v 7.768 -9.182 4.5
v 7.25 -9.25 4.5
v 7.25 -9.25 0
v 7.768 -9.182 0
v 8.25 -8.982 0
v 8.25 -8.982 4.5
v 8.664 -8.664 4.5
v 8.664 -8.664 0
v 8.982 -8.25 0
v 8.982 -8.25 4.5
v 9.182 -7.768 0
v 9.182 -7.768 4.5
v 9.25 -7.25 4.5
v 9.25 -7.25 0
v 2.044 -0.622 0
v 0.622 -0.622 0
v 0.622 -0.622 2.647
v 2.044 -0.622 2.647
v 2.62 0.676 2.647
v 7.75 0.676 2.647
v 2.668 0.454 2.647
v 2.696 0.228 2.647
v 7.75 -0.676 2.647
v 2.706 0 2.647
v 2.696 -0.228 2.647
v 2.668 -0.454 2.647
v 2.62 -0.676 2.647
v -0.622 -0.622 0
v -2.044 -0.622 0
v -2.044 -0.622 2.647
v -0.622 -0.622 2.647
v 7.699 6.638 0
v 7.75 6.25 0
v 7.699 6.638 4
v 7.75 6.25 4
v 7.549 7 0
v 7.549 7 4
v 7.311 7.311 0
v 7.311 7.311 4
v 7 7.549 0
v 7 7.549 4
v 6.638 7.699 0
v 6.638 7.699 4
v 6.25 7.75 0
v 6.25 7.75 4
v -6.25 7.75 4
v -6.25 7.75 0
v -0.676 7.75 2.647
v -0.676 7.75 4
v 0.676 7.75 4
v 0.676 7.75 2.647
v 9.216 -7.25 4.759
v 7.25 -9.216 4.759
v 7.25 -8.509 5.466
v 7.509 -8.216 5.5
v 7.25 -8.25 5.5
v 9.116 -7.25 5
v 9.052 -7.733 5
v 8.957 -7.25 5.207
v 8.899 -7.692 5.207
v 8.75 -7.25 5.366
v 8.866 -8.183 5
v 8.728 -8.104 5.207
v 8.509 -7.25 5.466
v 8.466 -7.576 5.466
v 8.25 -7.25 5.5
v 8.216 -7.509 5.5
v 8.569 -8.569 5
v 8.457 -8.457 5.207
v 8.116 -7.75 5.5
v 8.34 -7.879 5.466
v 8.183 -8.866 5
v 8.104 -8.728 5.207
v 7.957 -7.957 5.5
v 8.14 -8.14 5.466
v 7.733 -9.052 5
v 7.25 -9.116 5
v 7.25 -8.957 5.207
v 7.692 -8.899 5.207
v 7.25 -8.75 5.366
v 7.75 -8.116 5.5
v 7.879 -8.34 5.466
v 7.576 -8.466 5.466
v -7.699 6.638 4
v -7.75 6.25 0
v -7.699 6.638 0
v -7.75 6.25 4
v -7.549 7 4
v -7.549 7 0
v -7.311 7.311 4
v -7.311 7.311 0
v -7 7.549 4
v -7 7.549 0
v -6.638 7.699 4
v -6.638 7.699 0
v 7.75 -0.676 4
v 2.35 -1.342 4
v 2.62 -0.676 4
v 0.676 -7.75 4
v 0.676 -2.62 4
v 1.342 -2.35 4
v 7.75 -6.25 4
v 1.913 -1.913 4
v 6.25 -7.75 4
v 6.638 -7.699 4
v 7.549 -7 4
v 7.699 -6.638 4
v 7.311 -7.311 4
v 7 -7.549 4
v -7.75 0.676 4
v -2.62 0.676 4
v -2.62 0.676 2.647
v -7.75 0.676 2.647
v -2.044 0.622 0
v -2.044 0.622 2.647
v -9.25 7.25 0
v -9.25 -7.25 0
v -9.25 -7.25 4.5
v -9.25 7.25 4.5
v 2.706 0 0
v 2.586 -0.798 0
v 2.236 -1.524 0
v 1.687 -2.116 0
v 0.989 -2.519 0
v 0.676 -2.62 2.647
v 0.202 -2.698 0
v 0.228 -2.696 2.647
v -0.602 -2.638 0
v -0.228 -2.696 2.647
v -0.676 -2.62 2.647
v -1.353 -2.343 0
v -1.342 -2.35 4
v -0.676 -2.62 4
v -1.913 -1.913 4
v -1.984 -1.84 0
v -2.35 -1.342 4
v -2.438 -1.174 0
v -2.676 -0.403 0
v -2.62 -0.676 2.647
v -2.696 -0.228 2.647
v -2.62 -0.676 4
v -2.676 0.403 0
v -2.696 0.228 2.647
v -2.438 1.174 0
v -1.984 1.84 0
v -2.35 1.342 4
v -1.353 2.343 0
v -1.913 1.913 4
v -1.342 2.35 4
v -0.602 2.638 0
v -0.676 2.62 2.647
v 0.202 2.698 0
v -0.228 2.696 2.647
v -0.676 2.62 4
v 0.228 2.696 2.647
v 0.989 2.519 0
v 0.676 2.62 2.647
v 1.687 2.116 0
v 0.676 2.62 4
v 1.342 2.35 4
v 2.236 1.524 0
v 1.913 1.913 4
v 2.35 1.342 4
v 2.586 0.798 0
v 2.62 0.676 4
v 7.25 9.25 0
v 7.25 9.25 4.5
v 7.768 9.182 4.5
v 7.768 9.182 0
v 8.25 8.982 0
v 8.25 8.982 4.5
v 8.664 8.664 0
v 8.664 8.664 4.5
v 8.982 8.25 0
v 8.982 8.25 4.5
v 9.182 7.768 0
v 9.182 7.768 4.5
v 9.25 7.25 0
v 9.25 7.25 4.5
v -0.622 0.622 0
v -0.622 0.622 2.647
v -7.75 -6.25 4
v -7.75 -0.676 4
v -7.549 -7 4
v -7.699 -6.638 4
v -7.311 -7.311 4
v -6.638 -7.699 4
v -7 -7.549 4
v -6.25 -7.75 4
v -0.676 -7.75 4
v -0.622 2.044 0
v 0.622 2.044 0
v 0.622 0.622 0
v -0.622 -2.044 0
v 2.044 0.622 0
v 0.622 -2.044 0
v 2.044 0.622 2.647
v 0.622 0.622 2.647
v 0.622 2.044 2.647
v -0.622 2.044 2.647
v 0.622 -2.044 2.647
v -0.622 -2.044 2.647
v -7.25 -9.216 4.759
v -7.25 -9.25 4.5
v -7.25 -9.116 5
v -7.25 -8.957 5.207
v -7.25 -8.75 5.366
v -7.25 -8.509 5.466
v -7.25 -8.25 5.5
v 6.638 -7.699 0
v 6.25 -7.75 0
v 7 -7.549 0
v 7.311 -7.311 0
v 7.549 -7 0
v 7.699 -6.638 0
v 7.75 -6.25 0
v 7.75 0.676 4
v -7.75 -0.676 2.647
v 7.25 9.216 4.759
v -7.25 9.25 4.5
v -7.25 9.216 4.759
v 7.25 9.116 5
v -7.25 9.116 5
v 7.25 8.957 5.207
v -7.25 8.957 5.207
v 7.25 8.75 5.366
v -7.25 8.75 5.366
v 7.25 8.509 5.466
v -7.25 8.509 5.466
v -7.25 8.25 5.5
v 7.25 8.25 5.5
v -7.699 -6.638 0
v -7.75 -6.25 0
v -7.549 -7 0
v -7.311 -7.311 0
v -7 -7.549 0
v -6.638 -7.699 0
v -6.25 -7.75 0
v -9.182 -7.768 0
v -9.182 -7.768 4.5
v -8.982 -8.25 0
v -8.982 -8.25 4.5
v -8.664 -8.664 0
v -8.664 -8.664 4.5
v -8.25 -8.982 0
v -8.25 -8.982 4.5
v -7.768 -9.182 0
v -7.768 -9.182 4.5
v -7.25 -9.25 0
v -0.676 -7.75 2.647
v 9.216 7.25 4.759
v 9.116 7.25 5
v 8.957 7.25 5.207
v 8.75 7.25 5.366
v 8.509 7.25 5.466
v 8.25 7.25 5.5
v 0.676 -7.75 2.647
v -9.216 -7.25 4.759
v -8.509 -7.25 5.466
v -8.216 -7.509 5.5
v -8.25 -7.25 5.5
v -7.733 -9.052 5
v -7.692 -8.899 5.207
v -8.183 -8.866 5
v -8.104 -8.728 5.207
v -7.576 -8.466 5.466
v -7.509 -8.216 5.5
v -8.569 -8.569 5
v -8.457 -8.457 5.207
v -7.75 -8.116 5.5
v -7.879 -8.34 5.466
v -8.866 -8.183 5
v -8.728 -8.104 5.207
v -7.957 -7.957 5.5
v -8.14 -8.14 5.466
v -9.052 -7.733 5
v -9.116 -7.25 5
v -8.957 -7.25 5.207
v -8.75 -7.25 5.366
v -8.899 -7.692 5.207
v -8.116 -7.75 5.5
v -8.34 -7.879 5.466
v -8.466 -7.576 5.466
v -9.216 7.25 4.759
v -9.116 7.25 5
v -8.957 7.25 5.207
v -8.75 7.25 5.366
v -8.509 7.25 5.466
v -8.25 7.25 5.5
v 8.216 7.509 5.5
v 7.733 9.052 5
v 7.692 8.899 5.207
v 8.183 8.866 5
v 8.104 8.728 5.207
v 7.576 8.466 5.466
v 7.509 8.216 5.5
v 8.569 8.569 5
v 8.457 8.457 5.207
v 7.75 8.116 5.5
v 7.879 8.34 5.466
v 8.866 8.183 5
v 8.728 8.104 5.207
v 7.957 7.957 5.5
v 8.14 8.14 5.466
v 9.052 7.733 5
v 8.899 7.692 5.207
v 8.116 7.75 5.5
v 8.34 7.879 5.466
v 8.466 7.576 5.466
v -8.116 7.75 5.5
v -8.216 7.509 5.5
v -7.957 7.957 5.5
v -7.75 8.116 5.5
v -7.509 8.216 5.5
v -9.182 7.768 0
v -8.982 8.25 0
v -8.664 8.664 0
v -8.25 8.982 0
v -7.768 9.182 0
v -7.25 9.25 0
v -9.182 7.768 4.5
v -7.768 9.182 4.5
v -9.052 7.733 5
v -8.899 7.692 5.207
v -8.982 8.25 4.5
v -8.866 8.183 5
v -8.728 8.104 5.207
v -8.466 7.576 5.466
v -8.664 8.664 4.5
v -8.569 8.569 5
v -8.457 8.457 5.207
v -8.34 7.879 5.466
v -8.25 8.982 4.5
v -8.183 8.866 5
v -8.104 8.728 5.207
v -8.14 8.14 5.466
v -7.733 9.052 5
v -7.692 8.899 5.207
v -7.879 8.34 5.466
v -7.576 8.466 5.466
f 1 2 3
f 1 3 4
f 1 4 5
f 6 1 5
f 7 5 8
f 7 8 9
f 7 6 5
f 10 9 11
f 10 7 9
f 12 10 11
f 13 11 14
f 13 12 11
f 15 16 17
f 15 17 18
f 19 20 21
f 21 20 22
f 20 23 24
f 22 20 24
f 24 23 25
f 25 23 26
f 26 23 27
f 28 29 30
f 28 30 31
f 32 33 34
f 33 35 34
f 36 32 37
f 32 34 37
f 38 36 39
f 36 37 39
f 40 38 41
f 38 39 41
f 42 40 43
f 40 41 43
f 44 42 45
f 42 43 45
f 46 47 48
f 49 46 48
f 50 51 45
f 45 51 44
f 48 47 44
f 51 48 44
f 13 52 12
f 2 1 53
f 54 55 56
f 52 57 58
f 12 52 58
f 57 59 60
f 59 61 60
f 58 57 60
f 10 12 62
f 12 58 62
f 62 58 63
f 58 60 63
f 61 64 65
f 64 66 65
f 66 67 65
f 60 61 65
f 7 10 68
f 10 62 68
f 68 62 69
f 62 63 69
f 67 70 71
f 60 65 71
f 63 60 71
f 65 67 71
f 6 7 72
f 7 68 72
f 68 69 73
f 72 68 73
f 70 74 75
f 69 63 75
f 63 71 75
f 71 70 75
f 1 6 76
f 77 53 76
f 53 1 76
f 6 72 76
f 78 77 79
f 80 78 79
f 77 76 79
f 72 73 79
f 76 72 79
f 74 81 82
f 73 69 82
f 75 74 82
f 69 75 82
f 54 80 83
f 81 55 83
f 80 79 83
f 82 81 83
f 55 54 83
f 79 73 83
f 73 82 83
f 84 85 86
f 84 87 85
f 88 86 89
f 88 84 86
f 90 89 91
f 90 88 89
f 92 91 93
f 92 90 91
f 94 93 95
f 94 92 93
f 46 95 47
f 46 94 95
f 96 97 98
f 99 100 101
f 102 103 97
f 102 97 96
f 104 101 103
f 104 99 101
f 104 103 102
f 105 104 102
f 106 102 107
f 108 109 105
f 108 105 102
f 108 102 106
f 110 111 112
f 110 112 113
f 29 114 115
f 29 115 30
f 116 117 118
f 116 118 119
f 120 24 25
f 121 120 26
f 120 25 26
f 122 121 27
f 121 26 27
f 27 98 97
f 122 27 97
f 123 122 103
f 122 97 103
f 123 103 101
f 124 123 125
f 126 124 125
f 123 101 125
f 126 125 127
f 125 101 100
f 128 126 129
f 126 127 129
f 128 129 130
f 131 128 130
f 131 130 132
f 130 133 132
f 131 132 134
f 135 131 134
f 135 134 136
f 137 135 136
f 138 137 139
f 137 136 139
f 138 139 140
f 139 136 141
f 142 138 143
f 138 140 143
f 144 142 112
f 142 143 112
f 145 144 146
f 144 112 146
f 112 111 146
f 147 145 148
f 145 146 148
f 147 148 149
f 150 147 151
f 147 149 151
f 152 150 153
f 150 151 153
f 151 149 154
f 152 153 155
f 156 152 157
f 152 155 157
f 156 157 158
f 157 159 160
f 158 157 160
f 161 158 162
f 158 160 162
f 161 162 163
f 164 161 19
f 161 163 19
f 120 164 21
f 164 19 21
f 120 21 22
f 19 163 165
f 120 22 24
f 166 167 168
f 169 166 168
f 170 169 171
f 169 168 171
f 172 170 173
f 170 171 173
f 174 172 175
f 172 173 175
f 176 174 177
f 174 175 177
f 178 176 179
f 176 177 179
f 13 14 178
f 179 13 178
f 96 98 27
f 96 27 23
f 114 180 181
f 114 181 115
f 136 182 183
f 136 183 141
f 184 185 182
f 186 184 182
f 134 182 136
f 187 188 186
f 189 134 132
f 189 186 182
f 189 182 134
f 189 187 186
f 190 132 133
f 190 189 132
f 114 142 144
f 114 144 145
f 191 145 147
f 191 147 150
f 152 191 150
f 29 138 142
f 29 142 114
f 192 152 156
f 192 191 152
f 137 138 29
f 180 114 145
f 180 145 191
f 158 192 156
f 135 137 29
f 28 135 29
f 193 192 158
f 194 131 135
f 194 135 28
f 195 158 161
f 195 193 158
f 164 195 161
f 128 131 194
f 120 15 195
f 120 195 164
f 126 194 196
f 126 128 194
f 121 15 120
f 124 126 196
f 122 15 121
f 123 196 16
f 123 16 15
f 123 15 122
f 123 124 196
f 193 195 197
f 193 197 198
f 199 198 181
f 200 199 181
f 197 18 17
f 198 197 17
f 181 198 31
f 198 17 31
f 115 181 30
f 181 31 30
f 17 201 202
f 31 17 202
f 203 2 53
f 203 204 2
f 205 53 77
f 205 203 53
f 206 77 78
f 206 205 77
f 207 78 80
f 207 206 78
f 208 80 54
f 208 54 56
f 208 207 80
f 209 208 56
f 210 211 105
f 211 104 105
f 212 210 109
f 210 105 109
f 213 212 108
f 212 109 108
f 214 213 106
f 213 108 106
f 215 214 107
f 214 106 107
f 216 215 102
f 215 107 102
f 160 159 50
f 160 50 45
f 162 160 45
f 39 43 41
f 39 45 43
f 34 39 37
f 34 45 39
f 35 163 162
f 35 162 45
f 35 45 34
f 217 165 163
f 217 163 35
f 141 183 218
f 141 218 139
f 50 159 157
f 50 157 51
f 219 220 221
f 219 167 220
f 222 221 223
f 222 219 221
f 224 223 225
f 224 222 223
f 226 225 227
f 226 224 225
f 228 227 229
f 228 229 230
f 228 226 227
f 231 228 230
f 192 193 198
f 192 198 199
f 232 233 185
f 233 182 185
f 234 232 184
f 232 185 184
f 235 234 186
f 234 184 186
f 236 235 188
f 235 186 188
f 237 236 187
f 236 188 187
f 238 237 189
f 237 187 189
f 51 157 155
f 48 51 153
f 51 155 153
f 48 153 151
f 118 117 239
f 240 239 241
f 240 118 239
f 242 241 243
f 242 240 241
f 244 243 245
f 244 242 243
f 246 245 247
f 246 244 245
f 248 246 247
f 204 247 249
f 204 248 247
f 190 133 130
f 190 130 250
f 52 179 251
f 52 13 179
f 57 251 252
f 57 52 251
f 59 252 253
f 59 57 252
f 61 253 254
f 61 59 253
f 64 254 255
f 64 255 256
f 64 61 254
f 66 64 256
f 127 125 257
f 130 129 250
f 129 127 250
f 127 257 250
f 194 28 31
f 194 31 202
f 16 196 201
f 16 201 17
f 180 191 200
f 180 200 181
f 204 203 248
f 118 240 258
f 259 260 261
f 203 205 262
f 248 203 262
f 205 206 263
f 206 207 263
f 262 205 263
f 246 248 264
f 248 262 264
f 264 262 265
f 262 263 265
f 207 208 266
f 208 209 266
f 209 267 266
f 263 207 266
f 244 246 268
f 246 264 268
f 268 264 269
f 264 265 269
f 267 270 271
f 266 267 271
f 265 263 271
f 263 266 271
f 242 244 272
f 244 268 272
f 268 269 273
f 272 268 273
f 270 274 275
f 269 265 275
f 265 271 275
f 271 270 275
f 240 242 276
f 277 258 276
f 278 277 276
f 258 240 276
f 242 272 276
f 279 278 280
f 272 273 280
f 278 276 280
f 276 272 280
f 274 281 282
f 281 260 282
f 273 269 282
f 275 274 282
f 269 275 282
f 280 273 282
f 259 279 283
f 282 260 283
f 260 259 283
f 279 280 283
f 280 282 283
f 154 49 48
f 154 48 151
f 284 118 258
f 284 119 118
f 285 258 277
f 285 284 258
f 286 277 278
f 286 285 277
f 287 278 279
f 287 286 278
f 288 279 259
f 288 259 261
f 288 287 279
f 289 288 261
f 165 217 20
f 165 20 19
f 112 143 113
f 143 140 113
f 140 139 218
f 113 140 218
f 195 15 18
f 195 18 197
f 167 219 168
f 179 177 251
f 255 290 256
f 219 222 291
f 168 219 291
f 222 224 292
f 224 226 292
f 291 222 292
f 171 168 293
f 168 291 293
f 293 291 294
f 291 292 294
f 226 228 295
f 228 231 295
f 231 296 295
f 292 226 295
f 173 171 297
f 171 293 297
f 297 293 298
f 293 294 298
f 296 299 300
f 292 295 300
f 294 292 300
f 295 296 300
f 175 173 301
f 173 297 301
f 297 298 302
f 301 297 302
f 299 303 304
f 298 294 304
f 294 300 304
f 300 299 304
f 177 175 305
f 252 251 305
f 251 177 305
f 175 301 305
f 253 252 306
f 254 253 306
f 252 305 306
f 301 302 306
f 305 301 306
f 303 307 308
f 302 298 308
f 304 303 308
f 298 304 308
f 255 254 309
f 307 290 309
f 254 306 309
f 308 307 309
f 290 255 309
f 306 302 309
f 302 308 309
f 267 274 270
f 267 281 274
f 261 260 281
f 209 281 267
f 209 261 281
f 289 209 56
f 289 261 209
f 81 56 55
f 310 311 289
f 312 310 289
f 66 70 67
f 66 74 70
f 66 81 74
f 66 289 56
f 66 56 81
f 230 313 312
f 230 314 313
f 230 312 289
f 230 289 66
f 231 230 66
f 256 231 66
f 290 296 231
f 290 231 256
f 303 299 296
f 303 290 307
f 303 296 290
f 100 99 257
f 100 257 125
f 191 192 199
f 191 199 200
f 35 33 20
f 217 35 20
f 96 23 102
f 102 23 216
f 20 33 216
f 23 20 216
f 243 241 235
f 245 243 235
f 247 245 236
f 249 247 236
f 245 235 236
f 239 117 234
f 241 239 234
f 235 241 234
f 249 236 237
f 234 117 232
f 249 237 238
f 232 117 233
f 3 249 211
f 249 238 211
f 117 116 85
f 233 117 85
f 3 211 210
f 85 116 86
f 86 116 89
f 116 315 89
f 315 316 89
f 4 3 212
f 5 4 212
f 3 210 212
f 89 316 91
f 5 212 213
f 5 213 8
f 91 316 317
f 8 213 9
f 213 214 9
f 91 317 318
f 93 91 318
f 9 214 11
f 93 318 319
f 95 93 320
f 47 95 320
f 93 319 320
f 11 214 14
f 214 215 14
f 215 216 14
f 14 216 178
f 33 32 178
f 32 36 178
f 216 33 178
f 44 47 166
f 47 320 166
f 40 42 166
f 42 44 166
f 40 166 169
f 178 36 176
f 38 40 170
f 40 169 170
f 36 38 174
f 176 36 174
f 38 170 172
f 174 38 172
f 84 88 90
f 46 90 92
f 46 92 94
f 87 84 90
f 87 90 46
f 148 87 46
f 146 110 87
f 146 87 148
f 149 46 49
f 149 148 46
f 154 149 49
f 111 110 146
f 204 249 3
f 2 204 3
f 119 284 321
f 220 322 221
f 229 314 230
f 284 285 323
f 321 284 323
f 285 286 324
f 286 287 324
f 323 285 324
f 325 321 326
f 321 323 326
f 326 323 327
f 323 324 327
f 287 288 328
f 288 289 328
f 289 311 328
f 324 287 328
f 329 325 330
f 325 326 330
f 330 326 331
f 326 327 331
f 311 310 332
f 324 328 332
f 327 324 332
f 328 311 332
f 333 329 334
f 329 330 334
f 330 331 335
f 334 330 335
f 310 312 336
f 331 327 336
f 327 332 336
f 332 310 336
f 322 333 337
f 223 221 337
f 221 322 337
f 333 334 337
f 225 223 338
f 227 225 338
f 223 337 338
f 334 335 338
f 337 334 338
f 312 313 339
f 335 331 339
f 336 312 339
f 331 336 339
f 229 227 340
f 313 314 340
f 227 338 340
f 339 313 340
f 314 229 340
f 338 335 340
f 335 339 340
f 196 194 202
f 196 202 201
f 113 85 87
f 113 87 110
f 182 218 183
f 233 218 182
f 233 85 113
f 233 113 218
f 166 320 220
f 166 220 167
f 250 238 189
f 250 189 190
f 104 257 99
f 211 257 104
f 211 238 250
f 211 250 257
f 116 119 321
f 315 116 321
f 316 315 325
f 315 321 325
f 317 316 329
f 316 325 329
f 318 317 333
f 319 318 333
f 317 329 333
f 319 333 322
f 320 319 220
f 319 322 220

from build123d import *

# Parameters (mm, degrees)
SKETCH_W        = 18.5
SKETCH_H        = 18.5
PAD_DEPTH       = 5.5
SKETCH001_W     = 15.5
SKETCH001_H     = 15.5
POCKET_DEPTH    = 4
SKETCH002_R     = 2.7059
PAD001_DEPTH    = 4
POCKET001_DEPTH = 4
FILLET001_R     = 1.5
FILLET_R        = 2
PAD002_DEPTH    = 1.35295
FILLET002_R     = 1


with BuildPart() as part:
    # Sketch → Pad (new body)
    with BuildSketch(Plane.XY):
        Rectangle(SKETCH_W, SKETCH_H)
    extrude(amount=PAD_DEPTH)

    # Sketch001 → Pocket (cut)
    with BuildSketch(Plane(origin=(0, 0, 0), x_dir=(1, 0, 0), z_dir=(0, 0, -1))):
        Rectangle(SKETCH001_W, SKETCH001_H)
    extrude(amount=-POCKET_DEPTH, mode=Mode.SUBTRACT)

    # Sketch002 (on Face11 of Pocket) → Pad001 (join)
    with BuildSketch(Plane(origin=(0, 0, 4), x_dir=(1, 0, 0), z_dir=(0, 0, -1))):
        Circle(SKETCH002_R)
    extrude(amount=PAD001_DEPTH)

    # Sketch003 (on Face13 of Pad001) → Pocket001 (cut)
    with BuildSketch(Plane(origin=(0, 0, 0), x_dir=(1, 0, 0), z_dir=(0, 0, -1))):
        Polygon((-0.6219, 2.0443), (0.6219, 2.0443), (0.6219, 0.6219), (2.0443, 0.6219), (2.0443, -0.6219), (0.6219, -0.6219), (0.6219, -2.0443), (-0.6219, -2.0443), (-0.6219, -0.6219), (-2.0443, -0.6219), (-2.0443, 0.6219), (-0.6219, 0.6219), align=None)
    extrude(amount=-POCKET001_DEPTH, mode=Mode.SUBTRACT)

    # Fillet001
    fillet001_edges = [part.edges().sort_by_distance(p)[0] for p in [
        (-7.75, -7.75, 2),
        (7.75, -7.75, 2),
        (7.75, 7.75, 2),
        (-7.75, 7.75, 2),
    ]]
    fillet(fillet001_edges, radius=FILLET001_R)

    # Fillet
    fillet_edges = [part.edges().sort_by_distance(p)[0] for p in [
        (9.25, -9.25, 2.75),
        (-9.25, -9.25, 2.75),
        (-9.25, 9.25, 2.75),
        (9.25, 9.25, 2.75),
    ]]
    fillet(fillet_edges, radius=FILLET_R)

    # Sketch004 (on Face19 of Fillet) → Pad002 (join)
    with BuildSketch(Plane(origin=(0, 0, 4), x_dir=(1, 0, 0), z_dir=(0, 0, -1))):
        Polygon((-0.676475, 7.75), (0.676475, 7.75), (0.676475, 0.676475), (7.75, 0.676475), (7.75, -0.676475), (0.676475, -0.676475), (0.676475, -7.75), (-0.676475, -7.75), (-0.676475, -0.676475), (-7.75, -0.676475), (-7.75, 0.676475), (-0.676475, 0.676475), align=None)
    extrude(amount=PAD002_DEPTH)

    # Fillet002
    fillet002_edges = [part.edges().sort_by_distance(p)[0] for p in [
        (0, 9.25, 5.5),
        (-8.664214, 8.664214, 5.5),
        (8.664214, 8.664214, 5.5),
        (-9.25, 0, 5.5),
        (9.25, 0, 5.5),
        (-8.664214, -8.664214, 5.5),
        (8.664214, -8.664214, 5.5),
        (0, -9.25, 5.5),
    ]]
    fillet(fillet002_edges, radius=FILLET002_R)


solid = part.part
